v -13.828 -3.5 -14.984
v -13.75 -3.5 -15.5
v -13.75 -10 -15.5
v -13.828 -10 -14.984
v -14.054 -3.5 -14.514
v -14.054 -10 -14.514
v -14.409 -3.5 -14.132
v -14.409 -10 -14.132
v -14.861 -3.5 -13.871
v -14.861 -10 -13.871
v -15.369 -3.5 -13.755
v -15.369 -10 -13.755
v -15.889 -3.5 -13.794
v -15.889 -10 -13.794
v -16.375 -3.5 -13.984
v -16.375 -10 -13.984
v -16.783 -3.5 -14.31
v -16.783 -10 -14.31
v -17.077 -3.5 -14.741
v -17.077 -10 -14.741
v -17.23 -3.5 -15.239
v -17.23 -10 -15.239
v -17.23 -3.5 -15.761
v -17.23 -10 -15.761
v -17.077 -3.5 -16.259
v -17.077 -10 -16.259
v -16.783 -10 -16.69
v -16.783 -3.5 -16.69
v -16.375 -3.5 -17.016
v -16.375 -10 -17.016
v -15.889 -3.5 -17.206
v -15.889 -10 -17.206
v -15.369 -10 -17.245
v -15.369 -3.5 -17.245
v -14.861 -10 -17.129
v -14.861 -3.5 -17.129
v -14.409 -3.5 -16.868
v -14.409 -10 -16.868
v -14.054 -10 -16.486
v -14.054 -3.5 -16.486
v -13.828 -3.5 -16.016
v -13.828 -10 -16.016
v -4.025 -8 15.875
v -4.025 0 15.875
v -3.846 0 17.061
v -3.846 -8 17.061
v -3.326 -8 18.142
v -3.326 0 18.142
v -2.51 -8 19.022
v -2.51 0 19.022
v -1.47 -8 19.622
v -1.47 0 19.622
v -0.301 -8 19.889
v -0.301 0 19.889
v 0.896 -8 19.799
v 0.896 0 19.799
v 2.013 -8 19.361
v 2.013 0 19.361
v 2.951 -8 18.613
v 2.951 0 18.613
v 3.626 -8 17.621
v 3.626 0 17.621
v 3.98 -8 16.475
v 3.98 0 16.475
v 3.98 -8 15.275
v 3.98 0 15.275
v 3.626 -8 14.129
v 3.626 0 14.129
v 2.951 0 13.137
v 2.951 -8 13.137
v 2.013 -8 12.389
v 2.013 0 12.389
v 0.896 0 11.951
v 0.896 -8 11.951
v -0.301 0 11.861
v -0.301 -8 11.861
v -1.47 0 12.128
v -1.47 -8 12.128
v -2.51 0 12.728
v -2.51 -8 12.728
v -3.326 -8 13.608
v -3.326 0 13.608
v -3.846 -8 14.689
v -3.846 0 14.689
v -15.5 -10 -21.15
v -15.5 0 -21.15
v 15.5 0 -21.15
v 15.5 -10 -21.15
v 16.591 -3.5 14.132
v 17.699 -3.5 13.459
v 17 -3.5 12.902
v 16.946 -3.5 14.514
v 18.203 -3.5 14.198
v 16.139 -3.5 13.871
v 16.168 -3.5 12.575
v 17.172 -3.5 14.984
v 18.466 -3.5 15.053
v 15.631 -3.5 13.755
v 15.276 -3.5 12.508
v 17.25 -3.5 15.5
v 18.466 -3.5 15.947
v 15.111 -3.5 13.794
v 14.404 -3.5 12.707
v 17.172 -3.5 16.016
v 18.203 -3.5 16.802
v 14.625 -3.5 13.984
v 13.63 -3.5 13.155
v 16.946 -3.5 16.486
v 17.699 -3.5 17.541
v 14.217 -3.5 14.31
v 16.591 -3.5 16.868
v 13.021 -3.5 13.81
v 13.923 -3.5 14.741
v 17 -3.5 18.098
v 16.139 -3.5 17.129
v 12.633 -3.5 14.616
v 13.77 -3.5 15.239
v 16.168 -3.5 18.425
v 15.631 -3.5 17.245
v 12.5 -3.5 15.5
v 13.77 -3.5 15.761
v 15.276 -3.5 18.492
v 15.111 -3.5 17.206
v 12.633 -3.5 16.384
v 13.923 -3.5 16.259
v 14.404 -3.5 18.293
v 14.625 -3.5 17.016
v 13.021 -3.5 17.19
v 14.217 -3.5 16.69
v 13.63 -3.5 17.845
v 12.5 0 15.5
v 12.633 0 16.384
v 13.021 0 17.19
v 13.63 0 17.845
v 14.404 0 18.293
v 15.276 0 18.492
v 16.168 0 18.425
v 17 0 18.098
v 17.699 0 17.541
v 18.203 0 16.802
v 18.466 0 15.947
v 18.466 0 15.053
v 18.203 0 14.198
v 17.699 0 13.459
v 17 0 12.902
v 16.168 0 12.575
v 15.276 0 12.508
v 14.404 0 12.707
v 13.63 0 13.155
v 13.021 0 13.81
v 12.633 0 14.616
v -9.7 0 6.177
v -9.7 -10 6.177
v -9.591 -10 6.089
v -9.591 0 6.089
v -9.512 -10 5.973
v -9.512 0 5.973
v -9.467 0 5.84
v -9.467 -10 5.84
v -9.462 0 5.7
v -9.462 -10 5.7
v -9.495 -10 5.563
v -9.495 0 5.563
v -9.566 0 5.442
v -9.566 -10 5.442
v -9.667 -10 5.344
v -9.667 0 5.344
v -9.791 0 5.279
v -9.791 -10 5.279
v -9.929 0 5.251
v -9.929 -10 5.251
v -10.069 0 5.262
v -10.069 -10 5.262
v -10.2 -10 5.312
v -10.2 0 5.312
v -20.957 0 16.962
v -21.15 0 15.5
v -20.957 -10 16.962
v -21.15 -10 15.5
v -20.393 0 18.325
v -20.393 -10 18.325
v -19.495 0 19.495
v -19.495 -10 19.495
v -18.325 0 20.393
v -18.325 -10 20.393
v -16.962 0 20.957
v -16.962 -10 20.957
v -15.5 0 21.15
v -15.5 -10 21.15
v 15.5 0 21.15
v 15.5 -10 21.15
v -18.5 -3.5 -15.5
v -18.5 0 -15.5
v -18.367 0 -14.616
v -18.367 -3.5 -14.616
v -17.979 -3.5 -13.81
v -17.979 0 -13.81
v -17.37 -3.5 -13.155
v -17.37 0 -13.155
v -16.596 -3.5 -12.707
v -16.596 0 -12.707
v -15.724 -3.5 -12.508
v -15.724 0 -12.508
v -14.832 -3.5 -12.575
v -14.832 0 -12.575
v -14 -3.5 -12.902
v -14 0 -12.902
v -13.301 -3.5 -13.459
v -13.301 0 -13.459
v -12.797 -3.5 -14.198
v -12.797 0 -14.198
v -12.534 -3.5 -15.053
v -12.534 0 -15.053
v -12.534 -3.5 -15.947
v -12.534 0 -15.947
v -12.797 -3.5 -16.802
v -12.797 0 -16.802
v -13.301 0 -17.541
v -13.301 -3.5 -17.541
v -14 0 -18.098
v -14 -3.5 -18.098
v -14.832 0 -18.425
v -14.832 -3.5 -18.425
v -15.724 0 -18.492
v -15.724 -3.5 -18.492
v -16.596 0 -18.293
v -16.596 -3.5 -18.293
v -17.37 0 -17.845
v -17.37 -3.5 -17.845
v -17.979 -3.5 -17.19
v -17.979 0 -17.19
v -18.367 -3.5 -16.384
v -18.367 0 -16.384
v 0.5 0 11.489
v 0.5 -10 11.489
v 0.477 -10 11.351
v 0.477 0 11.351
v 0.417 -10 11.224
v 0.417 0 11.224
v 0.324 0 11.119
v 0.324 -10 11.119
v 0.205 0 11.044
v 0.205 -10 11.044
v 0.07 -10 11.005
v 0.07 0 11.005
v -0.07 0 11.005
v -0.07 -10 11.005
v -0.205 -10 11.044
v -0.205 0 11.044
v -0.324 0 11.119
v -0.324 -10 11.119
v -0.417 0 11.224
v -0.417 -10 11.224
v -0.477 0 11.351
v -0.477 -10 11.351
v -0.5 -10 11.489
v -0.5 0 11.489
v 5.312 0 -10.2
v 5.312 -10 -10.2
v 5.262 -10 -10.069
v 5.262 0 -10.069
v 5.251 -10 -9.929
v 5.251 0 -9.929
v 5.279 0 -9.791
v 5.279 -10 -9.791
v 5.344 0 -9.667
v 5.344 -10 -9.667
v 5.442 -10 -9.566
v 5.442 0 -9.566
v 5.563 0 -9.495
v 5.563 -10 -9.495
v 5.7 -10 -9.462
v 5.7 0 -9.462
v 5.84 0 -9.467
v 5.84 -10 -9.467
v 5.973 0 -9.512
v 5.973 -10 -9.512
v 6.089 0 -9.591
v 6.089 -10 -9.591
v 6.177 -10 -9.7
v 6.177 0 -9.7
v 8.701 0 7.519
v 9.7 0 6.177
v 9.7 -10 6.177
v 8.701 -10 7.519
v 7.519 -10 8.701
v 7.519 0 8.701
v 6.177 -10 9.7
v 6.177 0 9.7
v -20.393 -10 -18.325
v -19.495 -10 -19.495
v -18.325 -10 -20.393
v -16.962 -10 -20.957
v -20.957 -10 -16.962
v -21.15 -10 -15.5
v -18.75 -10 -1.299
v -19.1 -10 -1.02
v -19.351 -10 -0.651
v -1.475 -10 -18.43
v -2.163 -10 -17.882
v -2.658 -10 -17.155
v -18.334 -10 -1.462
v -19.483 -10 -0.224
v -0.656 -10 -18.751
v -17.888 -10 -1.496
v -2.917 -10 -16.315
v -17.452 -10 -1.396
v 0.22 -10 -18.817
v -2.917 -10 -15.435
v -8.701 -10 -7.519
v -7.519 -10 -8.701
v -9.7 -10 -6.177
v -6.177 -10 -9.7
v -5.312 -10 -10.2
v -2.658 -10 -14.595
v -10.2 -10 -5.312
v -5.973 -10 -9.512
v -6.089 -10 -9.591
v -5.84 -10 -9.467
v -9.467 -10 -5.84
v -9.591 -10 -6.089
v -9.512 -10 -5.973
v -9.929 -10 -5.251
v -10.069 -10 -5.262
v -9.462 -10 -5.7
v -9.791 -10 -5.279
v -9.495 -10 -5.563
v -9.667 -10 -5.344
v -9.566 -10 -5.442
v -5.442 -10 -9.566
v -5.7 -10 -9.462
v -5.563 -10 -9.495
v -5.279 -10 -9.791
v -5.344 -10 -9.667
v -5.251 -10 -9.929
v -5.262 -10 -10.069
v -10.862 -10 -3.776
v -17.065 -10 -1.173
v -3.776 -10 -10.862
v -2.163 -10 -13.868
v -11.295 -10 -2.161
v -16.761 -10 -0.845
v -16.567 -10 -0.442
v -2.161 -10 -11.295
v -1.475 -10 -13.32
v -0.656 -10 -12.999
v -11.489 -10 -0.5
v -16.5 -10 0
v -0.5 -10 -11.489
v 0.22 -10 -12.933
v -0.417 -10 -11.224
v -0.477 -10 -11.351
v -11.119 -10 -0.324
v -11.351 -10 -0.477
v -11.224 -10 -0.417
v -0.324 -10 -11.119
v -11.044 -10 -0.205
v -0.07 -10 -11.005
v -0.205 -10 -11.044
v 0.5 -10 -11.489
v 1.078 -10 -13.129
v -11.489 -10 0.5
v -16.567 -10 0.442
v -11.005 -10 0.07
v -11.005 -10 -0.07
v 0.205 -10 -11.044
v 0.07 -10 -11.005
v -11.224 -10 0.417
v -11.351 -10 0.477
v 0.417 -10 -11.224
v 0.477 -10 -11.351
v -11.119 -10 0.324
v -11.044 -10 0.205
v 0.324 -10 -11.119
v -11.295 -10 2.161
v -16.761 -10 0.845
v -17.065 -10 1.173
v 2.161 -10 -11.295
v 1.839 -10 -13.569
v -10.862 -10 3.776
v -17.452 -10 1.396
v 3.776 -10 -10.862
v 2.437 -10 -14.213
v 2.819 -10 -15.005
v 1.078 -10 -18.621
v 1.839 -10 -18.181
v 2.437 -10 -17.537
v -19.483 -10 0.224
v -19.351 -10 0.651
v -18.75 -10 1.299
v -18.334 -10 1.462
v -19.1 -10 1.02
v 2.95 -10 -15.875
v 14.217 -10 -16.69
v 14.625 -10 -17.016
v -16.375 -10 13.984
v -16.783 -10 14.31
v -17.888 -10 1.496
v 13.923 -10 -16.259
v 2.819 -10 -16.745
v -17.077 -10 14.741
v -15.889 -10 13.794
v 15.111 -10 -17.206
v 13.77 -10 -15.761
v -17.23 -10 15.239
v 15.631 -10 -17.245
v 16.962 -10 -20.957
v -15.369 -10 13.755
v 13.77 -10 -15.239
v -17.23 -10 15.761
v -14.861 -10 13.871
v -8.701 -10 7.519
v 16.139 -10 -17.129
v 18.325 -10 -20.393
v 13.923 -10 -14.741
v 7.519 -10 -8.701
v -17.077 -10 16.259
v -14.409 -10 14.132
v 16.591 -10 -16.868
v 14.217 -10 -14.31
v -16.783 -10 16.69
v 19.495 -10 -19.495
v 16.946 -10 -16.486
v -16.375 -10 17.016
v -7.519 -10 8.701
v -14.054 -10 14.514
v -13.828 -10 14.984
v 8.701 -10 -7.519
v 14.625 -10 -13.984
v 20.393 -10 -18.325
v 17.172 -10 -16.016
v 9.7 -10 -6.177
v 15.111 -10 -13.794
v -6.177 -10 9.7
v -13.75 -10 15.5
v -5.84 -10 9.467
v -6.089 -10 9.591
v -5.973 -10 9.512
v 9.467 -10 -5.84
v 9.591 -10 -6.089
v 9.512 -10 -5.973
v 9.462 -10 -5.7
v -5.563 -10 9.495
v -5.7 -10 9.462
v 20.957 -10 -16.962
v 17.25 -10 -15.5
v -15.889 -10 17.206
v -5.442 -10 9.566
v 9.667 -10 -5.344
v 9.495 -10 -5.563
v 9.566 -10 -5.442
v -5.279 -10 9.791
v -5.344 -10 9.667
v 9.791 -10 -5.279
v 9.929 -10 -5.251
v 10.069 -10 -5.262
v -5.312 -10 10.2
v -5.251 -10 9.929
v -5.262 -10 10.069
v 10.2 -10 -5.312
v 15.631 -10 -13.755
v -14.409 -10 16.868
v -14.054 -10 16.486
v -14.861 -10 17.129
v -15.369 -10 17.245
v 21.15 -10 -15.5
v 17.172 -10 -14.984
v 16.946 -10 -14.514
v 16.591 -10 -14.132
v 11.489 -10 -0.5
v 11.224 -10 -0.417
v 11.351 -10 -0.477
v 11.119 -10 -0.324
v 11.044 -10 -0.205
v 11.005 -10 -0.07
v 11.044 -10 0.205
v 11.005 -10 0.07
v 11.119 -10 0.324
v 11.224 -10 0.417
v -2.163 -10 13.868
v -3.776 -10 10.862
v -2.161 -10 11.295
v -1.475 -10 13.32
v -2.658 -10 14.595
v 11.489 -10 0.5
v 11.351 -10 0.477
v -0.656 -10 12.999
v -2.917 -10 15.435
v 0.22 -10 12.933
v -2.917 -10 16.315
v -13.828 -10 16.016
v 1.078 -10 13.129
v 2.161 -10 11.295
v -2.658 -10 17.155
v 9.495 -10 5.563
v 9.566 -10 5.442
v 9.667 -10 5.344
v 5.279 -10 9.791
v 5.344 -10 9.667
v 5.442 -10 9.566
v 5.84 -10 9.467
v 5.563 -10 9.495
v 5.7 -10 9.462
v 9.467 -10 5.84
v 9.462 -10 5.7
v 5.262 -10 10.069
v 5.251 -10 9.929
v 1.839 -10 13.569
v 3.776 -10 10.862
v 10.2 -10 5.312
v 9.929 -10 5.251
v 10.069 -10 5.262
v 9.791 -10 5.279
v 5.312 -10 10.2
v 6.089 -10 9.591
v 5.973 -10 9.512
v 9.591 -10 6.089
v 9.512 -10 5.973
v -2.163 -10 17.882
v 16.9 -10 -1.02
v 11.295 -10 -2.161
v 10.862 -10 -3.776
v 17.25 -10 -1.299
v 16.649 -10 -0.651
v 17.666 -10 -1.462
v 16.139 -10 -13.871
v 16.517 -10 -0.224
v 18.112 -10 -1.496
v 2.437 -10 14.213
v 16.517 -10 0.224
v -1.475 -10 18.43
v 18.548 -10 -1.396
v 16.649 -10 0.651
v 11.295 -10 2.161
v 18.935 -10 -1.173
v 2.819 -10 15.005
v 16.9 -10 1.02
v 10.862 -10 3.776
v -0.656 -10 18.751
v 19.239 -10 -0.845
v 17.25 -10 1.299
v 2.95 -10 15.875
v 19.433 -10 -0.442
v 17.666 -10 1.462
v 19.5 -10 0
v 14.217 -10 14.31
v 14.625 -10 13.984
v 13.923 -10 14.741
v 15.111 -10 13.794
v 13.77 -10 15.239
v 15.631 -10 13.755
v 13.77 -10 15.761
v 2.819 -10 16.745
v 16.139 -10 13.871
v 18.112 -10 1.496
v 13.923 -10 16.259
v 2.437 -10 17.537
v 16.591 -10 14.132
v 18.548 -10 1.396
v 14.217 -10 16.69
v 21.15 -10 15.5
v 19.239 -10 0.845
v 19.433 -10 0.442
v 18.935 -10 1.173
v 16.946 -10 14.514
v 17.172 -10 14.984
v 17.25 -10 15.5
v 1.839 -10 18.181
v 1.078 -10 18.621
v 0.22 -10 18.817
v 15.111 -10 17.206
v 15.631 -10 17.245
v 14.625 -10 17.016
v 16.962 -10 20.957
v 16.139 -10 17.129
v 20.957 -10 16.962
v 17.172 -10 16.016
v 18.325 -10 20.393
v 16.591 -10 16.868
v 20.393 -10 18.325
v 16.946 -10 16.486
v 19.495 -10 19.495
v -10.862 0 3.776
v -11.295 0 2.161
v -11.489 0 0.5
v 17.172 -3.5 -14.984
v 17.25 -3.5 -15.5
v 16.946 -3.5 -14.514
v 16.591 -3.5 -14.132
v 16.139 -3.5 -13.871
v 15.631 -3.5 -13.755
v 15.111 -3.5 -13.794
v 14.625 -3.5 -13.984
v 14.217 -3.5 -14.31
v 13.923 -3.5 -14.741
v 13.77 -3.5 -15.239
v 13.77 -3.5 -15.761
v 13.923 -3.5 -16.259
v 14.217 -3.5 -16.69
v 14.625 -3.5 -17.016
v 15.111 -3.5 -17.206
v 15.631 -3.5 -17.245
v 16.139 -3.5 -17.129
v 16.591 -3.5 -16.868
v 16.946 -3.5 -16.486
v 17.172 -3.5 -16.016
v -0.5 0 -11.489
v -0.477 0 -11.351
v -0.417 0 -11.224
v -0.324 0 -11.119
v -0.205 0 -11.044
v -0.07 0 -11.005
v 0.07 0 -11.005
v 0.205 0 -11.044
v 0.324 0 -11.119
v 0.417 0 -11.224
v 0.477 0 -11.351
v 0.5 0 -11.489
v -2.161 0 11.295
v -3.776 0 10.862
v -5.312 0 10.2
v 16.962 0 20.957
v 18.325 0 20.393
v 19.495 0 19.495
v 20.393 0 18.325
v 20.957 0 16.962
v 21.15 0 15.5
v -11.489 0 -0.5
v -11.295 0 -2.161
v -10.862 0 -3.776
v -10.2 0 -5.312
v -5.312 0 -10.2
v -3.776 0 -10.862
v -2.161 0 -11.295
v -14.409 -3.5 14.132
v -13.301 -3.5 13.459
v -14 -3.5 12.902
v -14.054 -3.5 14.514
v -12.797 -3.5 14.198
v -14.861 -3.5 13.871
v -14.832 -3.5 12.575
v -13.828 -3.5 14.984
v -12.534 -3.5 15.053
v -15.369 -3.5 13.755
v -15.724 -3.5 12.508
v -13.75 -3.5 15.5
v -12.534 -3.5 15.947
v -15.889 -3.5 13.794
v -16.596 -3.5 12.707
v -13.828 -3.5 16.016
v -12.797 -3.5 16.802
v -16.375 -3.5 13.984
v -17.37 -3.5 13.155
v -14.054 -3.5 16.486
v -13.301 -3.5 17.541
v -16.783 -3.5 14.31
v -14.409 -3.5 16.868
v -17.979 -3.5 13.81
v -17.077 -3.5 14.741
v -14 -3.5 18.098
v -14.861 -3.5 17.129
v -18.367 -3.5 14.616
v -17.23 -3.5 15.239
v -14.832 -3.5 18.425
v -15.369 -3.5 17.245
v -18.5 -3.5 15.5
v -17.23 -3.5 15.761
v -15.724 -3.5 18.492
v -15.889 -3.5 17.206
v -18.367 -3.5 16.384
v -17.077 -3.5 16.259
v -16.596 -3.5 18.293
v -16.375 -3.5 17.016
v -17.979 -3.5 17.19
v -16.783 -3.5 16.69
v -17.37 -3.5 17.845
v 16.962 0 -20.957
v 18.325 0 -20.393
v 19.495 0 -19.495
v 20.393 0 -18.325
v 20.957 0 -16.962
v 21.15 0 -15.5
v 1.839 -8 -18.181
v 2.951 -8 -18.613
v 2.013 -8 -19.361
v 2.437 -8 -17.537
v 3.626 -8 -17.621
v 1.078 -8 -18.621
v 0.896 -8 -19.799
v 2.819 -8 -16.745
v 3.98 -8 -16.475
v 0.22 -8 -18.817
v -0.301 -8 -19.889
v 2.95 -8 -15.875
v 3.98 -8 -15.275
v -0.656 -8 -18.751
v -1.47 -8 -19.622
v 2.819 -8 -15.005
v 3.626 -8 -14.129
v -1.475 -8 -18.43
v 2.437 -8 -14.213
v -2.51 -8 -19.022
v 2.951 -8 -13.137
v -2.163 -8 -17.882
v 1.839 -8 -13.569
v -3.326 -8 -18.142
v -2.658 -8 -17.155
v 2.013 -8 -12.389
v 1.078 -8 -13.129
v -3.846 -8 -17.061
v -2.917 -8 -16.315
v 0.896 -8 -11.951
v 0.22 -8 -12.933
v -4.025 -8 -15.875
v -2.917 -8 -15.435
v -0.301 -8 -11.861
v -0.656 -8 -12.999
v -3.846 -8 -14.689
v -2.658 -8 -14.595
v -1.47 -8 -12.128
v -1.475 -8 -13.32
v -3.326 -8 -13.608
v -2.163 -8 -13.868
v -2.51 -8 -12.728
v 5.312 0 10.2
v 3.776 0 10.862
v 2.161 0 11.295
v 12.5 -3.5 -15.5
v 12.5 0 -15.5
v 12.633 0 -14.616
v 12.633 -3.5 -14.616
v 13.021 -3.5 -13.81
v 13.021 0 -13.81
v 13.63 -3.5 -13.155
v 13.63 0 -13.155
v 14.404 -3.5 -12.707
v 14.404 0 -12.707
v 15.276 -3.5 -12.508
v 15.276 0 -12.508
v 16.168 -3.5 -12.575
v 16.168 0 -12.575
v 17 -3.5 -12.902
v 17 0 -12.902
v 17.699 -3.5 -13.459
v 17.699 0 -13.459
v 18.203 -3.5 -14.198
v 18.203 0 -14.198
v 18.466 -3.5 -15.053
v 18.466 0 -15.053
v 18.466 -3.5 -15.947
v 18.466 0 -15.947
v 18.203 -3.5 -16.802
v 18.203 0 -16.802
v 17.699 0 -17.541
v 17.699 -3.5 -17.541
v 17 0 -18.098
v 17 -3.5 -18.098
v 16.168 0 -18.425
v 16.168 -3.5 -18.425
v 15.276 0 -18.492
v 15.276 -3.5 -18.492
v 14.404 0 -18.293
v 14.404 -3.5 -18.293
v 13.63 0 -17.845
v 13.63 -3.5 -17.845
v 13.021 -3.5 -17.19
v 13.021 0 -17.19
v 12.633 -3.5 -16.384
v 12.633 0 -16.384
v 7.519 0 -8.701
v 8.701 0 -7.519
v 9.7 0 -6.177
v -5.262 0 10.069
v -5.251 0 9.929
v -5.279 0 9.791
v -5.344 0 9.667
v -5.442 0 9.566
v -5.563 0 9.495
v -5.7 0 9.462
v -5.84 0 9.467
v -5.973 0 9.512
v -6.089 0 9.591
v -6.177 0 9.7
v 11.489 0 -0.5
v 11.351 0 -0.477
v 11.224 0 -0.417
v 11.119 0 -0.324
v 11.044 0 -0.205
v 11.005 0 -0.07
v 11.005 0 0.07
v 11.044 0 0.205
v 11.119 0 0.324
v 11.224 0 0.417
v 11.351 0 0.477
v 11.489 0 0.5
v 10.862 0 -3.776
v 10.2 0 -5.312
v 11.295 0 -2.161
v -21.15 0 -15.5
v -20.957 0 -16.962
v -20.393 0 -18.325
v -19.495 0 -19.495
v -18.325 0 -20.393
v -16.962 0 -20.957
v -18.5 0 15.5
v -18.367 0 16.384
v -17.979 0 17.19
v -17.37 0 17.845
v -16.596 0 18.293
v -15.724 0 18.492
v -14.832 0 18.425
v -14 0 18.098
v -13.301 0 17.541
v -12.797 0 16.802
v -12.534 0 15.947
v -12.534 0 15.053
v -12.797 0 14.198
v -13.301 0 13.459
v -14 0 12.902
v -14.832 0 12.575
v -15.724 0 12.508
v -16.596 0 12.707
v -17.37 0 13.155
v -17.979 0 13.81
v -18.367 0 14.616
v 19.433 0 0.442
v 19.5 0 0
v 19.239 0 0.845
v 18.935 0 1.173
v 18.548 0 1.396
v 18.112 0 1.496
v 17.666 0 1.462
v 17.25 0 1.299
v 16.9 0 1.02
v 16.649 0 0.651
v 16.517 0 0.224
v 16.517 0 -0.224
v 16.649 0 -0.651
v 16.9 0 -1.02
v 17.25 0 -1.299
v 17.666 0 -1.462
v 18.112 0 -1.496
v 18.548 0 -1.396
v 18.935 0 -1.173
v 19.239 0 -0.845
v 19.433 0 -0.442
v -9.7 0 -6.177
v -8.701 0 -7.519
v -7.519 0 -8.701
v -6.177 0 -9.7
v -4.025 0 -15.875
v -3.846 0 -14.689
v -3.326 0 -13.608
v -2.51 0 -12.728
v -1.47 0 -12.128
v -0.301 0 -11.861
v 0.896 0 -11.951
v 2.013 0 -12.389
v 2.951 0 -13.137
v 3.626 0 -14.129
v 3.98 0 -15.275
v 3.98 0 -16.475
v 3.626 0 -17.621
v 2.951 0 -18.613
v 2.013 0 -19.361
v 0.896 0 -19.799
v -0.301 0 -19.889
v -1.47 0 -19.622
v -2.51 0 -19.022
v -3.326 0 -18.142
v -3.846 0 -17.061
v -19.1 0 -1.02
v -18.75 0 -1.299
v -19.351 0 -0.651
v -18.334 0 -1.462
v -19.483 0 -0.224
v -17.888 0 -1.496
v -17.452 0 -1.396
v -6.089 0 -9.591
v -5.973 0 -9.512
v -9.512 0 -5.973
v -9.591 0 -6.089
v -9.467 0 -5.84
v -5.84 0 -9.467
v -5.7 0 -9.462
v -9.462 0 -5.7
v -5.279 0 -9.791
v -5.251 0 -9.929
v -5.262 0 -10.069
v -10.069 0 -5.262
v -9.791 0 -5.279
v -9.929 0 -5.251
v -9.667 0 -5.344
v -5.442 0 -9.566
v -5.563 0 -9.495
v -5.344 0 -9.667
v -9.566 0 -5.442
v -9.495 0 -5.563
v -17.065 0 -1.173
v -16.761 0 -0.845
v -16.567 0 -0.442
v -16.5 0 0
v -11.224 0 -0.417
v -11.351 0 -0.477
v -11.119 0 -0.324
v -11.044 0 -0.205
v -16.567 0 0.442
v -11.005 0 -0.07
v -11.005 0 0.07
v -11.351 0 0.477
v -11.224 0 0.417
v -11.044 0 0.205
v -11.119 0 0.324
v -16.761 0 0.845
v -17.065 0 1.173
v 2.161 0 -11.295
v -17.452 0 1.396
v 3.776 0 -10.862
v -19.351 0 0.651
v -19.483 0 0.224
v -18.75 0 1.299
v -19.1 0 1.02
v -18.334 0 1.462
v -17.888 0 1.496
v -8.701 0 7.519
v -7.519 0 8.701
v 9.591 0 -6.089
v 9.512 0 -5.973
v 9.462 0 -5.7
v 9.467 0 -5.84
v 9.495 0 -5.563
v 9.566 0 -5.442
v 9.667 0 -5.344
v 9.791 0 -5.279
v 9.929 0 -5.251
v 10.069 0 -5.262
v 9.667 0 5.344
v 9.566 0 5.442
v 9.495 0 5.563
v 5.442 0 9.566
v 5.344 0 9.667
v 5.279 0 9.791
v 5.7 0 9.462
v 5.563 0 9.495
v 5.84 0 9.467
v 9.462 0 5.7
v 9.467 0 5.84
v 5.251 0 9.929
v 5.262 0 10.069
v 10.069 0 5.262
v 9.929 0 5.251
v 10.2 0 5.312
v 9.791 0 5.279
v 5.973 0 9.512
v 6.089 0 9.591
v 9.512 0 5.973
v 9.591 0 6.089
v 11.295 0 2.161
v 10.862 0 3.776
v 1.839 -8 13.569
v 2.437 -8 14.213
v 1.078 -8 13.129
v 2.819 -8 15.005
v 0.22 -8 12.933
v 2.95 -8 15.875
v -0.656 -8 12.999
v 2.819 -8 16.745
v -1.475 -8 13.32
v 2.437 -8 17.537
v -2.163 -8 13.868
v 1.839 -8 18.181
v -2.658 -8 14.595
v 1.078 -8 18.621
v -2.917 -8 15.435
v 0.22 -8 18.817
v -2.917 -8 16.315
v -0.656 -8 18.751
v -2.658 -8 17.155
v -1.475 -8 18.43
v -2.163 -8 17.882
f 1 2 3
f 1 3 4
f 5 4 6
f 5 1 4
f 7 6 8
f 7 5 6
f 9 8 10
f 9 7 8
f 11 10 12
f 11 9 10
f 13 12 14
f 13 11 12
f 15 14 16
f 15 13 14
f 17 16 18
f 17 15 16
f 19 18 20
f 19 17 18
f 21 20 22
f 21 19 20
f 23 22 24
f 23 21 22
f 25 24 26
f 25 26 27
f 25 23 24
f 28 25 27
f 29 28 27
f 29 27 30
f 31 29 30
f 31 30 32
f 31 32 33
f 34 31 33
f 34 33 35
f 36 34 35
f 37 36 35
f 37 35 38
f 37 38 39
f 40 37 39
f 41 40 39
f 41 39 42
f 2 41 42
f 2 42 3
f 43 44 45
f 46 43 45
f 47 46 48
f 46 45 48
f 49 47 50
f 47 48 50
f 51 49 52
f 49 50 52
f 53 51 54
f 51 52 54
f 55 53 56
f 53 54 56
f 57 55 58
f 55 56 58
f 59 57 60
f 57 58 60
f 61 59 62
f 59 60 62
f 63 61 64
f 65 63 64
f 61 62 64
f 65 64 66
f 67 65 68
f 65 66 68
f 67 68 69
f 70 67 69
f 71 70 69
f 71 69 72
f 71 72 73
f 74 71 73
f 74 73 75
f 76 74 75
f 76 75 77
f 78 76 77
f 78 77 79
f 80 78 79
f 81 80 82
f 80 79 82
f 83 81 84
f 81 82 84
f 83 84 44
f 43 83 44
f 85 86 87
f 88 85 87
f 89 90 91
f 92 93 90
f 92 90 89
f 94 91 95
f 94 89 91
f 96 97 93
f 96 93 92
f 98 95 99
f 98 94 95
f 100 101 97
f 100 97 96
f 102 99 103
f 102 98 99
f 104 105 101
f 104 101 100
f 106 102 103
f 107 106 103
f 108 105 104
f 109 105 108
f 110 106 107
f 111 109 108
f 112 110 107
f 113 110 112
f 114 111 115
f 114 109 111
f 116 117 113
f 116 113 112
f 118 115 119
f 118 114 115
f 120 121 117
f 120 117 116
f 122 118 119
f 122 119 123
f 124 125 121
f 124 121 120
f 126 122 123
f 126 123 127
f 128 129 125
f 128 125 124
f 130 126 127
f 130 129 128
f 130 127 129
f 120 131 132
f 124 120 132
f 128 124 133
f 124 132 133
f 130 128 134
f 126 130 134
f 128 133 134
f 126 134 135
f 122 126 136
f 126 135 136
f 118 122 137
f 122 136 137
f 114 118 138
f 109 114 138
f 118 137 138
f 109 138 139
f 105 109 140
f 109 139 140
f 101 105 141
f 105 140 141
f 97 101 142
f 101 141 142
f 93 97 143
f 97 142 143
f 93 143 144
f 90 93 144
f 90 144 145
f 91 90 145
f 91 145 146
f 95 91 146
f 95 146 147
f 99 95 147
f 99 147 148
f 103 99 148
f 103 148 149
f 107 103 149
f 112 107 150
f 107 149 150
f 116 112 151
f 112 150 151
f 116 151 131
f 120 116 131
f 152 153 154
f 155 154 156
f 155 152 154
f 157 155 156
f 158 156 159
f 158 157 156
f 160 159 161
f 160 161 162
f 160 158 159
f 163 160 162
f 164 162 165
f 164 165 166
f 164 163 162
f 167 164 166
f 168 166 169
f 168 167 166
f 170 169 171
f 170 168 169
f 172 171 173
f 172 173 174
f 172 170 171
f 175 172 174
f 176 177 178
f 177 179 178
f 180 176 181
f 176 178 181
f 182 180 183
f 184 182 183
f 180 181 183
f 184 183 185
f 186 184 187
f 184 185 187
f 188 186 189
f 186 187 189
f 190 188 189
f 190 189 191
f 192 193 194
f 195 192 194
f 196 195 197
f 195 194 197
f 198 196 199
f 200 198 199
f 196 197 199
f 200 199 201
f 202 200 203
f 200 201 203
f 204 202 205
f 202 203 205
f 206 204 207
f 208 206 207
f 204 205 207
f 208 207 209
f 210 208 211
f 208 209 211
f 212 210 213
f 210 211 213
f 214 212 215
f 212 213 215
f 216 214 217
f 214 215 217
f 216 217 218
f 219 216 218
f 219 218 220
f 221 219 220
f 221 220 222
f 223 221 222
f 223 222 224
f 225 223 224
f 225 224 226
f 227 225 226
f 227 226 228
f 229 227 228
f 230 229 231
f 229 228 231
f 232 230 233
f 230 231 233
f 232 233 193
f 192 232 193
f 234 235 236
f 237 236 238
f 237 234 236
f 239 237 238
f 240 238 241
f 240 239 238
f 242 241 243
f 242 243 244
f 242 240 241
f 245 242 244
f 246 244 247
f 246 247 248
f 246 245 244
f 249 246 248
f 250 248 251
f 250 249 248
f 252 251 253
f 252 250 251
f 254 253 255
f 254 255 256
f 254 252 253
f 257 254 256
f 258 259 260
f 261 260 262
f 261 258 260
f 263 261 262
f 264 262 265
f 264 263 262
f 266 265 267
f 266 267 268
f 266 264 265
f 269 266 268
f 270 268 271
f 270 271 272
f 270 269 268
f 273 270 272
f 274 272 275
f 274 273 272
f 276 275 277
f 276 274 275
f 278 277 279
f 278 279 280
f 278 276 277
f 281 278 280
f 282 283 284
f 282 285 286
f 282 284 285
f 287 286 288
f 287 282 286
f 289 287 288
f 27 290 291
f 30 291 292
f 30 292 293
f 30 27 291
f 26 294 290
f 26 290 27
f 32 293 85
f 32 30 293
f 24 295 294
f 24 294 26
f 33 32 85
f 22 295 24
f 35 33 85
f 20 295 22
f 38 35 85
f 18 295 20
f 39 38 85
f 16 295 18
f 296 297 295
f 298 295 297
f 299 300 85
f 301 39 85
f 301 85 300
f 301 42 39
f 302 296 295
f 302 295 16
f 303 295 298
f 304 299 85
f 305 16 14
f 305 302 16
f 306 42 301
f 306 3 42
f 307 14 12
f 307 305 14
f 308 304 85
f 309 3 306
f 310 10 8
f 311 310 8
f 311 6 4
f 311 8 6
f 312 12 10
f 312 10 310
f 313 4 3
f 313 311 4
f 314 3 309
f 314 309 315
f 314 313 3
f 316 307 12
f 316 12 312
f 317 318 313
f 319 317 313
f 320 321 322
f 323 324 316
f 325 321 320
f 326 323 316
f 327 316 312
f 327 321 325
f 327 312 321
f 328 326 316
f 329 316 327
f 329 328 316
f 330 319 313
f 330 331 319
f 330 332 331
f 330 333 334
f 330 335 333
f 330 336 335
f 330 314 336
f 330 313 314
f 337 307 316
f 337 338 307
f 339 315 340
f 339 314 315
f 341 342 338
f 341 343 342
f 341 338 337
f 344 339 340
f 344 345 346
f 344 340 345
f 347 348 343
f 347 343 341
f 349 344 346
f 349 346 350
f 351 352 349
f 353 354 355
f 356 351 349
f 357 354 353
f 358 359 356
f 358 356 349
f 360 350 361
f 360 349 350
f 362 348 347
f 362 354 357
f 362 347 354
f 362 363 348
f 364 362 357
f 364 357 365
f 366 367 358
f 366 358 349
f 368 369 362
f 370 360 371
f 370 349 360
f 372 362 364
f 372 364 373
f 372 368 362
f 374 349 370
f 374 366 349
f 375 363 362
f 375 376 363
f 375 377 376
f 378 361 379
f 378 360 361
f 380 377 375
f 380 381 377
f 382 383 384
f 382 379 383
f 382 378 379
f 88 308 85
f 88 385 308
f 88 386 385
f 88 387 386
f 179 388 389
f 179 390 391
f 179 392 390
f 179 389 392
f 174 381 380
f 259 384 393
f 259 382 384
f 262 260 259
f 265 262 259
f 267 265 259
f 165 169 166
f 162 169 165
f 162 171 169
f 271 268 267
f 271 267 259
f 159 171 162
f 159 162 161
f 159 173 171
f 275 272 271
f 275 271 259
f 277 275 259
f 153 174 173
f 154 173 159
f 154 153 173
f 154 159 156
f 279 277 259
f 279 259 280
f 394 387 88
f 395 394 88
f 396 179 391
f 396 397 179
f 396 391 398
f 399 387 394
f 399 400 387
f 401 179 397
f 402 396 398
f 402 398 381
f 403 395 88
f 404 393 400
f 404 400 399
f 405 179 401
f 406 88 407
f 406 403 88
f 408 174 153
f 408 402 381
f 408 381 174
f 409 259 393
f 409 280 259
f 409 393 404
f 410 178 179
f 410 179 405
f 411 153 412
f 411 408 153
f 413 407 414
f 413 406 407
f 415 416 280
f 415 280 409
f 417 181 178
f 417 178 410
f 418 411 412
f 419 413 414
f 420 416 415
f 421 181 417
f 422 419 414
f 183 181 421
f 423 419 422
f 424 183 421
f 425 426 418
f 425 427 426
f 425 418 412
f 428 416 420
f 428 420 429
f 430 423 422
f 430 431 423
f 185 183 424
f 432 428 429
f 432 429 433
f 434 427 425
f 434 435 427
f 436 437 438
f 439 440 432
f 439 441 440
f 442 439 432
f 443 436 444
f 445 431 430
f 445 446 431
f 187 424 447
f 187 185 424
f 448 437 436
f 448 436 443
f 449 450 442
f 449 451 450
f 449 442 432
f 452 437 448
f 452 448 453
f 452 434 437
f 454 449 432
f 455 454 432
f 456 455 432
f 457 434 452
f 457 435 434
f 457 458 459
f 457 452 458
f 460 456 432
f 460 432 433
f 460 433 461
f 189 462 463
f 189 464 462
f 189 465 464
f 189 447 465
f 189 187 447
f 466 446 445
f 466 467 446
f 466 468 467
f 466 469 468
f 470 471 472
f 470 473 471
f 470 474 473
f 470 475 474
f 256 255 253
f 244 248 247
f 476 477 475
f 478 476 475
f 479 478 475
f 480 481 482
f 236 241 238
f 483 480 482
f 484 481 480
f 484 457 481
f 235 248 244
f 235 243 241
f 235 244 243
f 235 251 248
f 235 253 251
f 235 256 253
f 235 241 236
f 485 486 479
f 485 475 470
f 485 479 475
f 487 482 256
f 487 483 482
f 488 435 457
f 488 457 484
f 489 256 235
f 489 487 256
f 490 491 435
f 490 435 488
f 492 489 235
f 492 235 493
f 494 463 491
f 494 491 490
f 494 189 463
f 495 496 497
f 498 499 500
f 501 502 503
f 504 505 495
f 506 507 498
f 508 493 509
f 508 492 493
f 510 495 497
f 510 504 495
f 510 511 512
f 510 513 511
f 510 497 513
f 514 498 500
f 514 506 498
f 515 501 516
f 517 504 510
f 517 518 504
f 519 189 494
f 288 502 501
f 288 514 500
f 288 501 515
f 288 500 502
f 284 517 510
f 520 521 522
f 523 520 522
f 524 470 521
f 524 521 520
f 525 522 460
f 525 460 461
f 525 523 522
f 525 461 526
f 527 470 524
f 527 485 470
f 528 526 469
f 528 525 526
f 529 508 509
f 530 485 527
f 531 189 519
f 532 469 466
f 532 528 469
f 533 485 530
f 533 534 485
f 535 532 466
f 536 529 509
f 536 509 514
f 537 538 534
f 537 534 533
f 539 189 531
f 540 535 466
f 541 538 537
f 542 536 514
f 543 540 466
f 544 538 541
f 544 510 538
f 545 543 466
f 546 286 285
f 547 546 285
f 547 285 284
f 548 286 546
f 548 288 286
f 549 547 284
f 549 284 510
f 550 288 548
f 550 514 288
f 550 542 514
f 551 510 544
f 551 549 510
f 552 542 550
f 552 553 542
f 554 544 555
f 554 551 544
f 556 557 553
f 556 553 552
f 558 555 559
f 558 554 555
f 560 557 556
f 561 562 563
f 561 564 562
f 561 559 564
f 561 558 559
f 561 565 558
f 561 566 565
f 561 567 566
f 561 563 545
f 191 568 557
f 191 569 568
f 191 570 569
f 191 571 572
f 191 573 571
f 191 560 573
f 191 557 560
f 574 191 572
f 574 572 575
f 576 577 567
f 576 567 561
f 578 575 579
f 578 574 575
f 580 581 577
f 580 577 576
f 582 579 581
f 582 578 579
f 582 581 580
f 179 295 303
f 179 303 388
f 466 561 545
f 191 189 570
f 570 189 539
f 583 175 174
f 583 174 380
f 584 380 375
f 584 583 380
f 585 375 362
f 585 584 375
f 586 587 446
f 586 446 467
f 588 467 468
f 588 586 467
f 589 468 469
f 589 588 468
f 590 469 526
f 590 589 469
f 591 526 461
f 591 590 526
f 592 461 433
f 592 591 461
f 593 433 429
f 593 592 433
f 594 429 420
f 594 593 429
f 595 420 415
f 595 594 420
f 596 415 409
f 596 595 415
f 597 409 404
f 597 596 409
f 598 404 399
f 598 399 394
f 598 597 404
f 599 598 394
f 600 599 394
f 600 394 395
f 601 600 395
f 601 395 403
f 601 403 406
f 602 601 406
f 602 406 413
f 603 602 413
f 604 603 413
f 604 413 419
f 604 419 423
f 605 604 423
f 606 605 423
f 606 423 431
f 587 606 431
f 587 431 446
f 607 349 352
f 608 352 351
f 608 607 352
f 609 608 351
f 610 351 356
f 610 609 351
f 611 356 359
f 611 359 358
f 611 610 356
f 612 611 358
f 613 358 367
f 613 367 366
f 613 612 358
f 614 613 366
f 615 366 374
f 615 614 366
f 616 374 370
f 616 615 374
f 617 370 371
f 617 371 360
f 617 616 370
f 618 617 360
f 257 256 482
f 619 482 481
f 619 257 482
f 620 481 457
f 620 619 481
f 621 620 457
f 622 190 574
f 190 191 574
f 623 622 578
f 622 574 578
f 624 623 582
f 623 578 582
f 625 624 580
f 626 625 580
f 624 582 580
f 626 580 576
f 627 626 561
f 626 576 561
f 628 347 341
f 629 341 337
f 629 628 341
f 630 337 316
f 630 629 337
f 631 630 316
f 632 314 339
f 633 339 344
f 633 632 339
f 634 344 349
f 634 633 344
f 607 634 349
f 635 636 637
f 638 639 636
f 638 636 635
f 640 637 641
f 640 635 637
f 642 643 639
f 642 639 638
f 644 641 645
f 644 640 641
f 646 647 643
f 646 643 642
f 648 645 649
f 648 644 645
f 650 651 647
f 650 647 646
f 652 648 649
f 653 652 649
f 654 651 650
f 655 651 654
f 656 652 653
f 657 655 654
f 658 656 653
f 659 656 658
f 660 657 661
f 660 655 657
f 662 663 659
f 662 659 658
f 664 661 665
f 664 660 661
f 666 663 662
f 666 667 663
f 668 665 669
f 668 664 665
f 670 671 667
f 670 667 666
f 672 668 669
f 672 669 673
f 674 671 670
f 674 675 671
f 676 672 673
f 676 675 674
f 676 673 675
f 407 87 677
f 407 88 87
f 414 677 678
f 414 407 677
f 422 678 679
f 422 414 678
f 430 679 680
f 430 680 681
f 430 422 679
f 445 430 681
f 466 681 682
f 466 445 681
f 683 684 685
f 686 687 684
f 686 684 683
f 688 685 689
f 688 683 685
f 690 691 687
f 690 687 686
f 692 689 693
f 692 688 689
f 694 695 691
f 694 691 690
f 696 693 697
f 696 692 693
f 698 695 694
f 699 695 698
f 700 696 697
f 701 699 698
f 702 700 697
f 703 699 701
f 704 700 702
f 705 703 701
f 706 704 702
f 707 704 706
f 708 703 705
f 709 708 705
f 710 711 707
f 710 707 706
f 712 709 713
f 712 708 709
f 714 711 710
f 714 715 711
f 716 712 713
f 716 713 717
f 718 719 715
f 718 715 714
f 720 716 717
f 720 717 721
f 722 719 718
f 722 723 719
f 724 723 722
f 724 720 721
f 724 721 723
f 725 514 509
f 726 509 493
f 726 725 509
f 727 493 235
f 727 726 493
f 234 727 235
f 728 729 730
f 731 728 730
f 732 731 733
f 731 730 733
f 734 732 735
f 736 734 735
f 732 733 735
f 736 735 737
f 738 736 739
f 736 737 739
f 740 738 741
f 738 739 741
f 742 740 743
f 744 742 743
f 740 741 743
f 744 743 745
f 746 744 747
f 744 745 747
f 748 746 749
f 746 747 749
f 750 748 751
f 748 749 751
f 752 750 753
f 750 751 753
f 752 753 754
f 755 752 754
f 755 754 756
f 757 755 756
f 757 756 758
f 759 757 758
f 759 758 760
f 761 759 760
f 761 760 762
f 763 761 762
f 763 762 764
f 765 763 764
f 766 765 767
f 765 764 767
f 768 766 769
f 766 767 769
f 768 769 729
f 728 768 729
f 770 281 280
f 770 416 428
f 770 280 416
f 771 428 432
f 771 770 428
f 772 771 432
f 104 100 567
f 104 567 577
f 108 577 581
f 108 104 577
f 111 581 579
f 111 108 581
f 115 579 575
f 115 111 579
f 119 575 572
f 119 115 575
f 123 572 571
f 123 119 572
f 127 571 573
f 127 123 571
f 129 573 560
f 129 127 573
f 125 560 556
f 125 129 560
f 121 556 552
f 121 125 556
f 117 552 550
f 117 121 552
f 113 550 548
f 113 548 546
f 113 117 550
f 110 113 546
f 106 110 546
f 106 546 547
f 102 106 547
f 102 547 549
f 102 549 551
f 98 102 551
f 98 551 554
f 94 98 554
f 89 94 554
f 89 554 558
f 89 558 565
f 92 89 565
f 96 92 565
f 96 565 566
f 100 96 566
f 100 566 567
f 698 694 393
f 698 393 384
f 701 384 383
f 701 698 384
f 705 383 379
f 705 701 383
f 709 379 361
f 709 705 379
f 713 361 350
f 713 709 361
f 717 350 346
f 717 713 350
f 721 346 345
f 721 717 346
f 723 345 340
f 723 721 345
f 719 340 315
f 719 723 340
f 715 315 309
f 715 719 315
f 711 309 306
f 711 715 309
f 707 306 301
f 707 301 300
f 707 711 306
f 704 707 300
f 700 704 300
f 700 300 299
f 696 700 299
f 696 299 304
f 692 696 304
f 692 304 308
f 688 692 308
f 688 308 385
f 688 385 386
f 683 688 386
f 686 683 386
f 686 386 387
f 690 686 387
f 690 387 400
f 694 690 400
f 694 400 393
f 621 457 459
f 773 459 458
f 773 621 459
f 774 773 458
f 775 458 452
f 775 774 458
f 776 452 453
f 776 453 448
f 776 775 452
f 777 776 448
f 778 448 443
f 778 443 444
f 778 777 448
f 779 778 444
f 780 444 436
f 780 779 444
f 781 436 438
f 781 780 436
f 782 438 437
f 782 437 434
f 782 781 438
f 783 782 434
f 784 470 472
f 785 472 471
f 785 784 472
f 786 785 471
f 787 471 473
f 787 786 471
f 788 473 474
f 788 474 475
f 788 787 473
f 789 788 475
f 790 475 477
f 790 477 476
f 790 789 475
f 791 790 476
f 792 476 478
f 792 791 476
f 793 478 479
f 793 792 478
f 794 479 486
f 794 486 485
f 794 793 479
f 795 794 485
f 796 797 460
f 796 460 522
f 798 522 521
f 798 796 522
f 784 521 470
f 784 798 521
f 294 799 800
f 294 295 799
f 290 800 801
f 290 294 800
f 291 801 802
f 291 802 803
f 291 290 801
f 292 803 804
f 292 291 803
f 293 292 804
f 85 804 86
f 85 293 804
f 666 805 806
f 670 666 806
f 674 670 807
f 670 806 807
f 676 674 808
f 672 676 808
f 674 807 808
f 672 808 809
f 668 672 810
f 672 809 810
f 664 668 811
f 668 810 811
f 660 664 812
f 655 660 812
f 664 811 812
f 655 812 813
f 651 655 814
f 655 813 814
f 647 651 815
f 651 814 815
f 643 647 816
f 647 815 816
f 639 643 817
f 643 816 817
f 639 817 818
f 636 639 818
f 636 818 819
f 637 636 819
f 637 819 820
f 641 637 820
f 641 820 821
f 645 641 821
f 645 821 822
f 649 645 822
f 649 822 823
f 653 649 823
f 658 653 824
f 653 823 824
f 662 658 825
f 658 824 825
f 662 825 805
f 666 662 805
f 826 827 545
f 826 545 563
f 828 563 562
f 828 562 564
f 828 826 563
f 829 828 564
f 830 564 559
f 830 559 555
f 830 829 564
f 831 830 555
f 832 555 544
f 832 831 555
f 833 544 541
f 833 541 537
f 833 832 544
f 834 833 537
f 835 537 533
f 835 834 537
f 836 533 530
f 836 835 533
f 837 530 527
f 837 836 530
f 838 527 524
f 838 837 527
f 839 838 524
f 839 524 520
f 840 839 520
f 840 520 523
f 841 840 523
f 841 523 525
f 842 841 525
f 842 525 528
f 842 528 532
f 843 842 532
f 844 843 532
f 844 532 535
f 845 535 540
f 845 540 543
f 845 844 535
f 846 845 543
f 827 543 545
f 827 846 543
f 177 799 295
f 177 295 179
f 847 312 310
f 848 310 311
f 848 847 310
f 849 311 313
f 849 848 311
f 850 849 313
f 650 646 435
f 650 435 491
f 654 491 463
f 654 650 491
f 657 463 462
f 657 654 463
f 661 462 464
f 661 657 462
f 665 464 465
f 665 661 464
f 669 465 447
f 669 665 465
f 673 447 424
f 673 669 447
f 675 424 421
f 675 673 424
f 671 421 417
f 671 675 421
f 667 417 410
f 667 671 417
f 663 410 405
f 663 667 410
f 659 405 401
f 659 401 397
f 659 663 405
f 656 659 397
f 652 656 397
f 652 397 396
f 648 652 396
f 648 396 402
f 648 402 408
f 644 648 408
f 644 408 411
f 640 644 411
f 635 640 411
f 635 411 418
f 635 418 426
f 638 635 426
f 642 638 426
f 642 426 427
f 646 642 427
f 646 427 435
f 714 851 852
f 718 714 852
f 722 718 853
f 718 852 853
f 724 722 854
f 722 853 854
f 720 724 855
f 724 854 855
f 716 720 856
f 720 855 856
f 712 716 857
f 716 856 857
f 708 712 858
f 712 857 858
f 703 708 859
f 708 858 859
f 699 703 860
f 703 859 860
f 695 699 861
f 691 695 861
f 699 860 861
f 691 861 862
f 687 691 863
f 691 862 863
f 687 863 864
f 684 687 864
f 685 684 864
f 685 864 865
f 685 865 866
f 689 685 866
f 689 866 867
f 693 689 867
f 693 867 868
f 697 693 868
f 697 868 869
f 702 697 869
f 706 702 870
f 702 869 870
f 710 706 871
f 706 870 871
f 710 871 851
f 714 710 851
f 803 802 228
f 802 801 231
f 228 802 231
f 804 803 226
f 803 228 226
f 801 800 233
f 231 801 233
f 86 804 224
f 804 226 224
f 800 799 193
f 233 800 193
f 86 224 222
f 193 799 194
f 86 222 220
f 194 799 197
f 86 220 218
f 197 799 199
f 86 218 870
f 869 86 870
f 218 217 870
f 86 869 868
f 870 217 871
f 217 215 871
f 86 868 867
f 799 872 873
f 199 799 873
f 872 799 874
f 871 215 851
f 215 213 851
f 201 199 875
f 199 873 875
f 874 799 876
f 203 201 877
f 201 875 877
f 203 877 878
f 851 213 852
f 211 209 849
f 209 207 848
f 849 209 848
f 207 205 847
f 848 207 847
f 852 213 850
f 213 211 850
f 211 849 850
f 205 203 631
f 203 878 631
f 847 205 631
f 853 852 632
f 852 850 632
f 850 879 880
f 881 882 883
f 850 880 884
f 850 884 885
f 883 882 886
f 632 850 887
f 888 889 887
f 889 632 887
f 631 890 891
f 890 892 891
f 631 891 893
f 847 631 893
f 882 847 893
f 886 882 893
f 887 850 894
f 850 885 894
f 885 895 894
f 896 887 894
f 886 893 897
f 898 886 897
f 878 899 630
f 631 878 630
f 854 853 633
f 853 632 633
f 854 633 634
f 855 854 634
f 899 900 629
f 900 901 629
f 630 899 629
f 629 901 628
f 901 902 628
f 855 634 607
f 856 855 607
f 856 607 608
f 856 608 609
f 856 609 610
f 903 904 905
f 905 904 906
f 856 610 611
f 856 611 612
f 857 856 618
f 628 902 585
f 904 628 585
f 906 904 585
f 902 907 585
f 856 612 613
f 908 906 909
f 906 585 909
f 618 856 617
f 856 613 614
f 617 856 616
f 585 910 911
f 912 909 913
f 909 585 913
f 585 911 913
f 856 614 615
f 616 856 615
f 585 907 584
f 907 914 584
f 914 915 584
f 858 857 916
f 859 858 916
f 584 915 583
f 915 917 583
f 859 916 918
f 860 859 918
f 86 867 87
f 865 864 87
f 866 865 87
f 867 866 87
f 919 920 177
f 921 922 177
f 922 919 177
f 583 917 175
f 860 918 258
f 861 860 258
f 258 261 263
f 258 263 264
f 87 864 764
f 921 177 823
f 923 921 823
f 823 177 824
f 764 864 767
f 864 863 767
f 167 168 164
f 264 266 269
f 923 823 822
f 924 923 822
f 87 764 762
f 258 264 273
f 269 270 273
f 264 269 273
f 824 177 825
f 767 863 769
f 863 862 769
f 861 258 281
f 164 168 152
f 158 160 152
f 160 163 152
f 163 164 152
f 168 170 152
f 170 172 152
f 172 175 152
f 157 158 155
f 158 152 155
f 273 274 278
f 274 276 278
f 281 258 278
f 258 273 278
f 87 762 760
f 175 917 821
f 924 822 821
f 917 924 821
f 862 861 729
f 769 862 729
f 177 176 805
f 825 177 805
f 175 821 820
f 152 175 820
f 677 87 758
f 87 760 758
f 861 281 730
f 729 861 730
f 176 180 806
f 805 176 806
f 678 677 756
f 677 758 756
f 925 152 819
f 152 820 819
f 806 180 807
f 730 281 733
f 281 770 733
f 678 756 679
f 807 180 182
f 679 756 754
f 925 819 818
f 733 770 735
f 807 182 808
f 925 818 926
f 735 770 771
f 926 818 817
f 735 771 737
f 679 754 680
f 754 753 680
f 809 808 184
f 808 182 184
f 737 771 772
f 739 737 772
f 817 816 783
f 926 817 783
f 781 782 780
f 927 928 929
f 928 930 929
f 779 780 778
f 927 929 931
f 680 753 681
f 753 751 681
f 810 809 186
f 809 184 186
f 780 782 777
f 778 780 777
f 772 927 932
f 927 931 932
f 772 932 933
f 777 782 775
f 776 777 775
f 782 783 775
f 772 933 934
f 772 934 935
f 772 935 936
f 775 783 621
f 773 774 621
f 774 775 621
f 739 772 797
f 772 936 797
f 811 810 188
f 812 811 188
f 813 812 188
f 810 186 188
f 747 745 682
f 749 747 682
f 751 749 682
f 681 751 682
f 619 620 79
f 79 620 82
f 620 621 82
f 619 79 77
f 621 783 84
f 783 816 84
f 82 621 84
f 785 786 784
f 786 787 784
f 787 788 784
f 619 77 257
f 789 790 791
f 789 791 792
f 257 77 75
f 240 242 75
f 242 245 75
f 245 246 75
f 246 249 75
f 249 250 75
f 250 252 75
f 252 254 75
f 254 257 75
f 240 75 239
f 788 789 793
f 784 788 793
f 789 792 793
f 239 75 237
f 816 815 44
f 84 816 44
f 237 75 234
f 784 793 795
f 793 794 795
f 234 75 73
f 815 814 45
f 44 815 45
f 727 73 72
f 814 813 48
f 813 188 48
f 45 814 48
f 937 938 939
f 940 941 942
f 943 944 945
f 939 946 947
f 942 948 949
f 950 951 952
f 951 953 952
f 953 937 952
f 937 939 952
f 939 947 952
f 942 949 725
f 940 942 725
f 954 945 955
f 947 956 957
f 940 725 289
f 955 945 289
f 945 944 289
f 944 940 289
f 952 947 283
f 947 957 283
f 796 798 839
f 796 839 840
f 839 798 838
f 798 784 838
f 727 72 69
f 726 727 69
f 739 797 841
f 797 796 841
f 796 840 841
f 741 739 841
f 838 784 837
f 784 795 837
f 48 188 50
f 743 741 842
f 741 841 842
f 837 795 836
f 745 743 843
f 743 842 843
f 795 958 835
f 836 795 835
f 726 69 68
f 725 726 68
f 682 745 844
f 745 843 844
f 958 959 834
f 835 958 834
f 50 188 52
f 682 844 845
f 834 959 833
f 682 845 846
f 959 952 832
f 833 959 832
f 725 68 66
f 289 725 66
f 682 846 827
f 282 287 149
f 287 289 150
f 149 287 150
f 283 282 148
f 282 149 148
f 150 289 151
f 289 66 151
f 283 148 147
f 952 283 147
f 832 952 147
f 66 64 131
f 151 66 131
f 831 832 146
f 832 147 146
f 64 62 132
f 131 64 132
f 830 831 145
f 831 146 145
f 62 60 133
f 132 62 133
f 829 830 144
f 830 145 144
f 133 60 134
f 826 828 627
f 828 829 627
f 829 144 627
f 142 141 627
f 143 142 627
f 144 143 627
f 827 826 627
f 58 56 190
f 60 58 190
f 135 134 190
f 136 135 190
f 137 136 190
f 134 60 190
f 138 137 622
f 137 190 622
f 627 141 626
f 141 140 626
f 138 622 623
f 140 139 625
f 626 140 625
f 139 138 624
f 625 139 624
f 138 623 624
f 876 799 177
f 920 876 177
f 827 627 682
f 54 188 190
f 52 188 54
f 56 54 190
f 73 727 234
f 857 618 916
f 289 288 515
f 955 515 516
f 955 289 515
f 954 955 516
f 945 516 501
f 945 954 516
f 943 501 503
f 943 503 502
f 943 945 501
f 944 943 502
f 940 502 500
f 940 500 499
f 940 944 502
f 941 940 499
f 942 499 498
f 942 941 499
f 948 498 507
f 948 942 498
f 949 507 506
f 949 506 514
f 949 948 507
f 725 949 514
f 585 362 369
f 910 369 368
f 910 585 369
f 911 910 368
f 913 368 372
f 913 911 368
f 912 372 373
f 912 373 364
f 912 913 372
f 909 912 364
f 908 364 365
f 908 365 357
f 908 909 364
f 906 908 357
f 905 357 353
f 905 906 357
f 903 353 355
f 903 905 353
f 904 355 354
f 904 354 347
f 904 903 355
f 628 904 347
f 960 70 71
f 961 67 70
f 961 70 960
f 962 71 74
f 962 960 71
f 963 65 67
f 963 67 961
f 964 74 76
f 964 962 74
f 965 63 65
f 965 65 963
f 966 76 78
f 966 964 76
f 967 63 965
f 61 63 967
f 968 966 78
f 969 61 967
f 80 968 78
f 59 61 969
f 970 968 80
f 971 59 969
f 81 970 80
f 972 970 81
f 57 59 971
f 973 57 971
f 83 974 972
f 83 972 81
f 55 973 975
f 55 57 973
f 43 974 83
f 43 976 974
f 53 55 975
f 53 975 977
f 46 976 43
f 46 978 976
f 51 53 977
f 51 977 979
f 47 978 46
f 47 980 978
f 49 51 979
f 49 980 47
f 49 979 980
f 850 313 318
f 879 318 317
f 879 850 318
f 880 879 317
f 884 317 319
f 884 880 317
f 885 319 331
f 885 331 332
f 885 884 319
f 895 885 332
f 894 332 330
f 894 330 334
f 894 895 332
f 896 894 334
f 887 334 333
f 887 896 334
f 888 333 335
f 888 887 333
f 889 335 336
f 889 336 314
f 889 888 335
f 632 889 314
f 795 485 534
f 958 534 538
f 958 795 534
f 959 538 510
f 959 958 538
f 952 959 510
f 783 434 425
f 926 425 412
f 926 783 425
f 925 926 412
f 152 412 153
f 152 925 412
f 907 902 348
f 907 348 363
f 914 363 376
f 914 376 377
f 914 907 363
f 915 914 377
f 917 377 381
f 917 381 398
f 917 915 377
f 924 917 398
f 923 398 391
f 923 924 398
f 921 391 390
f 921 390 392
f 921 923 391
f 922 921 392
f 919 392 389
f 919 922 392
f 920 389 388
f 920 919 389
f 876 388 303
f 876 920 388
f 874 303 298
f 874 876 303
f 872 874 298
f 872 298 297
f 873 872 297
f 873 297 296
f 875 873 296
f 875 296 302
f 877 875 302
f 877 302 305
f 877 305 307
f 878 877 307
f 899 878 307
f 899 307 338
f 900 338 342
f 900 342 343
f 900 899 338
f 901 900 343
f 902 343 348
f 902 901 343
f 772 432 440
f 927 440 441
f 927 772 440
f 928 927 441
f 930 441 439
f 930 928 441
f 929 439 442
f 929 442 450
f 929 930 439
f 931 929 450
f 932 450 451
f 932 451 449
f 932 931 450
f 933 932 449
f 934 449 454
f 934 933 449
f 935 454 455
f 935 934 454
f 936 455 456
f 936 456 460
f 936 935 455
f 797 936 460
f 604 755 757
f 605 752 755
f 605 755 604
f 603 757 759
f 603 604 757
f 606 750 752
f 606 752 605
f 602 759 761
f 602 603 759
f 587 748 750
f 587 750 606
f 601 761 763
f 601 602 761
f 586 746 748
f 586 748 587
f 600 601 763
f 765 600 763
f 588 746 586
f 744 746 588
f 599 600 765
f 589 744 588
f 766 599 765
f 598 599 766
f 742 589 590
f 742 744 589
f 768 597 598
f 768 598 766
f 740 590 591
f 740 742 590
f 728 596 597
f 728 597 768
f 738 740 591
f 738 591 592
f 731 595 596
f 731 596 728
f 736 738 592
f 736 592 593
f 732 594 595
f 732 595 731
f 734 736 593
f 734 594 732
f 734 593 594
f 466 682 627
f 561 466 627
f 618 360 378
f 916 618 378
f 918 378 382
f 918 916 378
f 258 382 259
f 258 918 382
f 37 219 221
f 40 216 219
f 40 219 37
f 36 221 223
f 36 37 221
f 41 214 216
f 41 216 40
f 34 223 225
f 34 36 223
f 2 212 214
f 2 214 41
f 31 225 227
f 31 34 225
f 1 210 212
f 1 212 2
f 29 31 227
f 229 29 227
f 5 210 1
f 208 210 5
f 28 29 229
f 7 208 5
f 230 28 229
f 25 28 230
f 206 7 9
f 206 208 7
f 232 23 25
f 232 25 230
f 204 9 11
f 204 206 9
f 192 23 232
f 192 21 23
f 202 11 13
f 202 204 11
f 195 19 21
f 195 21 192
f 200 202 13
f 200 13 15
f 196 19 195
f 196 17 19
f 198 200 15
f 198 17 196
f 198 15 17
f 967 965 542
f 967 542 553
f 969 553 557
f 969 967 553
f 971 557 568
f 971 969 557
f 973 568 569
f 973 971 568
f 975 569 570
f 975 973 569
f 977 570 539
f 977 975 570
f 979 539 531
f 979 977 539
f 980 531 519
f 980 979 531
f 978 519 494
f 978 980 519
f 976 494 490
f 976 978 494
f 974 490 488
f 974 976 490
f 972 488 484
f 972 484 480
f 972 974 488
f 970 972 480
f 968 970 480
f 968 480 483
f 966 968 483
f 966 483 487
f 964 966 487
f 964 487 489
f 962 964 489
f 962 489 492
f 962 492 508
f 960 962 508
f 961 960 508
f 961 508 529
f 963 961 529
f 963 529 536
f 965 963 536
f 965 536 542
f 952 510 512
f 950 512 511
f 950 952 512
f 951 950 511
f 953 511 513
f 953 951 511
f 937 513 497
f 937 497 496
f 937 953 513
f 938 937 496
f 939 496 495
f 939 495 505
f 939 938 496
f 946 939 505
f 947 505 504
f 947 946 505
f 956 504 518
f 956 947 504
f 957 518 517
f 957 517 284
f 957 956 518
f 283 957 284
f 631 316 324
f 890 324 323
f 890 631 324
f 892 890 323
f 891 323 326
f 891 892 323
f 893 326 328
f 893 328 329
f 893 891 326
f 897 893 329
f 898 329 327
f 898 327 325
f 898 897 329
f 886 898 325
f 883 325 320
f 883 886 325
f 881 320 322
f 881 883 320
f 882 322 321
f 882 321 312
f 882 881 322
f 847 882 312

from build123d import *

# Parameters (mm, degrees)
F0_W            = 42.3
F0_H            = 42.3
F0_R            = 1.75
F0_R_2          = 2.95
F0_R_3          = 1.5
F0_R_4          = 11.5
F1_DEPTH        = 10
F2_R            = 3
F3_DEPTH        = 3.5
F4_R            = 4.025
F5_DEPTH        = 8
F6_R            = 5.65
F8_DEPTH        = 10
F8_COPIES_COUNT = 12


# Not quite as in the source:
# - a pattern or mirror of a feature is missing from the dataset's text; its kind, count and spacing are read off the source's solid


with BuildPart() as f1:
    # F0 (on Front) → F1 (new body)
    with BuildSketch(Plane.XZ):
        Rectangle(F0_W, F0_H)
        with Locations((-15.5, -15.5)):
            Circle(F0_R, mode=Mode.SUBTRACT)
        with Locations((0, -15.875)):
            Circle(F0_R_2, mode=Mode.SUBTRACT)
        with Locations((15.5, -15.5)):
            Circle(F0_R, mode=Mode.SUBTRACT)
        with Locations((-18, 0)):
            Circle(F0_R_3, mode=Mode.SUBTRACT)
        with Locations((-15.5, 15.5)):
            Circle(F0_R, mode=Mode.SUBTRACT)
        Circle(F0_R_4, mode=Mode.SUBTRACT)
        with Locations((18, 0)):
            Circle(F0_R_3, mode=Mode.SUBTRACT)
        with Locations((0, 15.875)):
            Circle(F0_R_2, mode=Mode.SUBTRACT)
        with Locations((15.5, 15.5)):
            Circle(F0_R, mode=Mode.SUBTRACT)
    extrude(amount=F1_DEPTH)

    # F2 (on face) → F3 (cut)
    with BuildSketch(Plane(origin=(0, 0, 0), x_dir=(-1, 0, 0), z_dir=(0, 1, 0))):
        with Locations((-15.5, 15.5)):
            Circle(F2_R)
        with Locations((15.5, 15.5)):
            Circle(F2_R)
        with Locations((15.5, -15.5)):
            Circle(F2_R)
        with Locations((-15.5, -15.5)):
            Circle(F2_R)
    extrude(amount=-F3_DEPTH, mode=Mode.SUBTRACT)

    # F4 (on face) → F5 (cut)
    with BuildSketch(Plane(origin=(0, 0, 0), x_dir=(-1, 0, 0), z_dir=(0, 1, 0))):
        with Locations((0, 15.875)):
            Circle(F4_R)
        with Locations((0, -15.875)):
            Circle(F4_R)
    extrude(amount=-F5_DEPTH, mode=Mode.SUBTRACT)

    # F6
    f6_edges = [f1.edges().sort_by_distance(p)[0] for p in [
        (21.15, -5, 21.15),
        (21.15, -5, -21.15),
        (-21.15, -5, 21.15),
        (-21.15, -5, -21.15),
    ]]
    fillet(f6_edges, radius=F6_R)

    # F7 (on face) → F8 (join)
    with BuildSketch(Plane(origin=(0, 0, 0), x_dir=(-1, 0, 0), z_dir=(0, 1, 0))):
        with BuildLine():
            ThreePointArc((11.4891304348, -0.4998818386), (11.5, 0), (11.4891304348, 0.4998818386))
            ThreePointArc((11.4891304348, 0.4998818386), (11, 0), (11.4891304348, -0.4998818386))
        make_face()
    f8 = extrude(amount=-F8_DEPTH)

    # F8_copies: F8 ×12 about axis
    f8_copies_axis = Axis((0, 0, 0), (0, 1, 0))
    for i in range(1, F8_COPIES_COUNT):
        add(f8.rotate(f8_copies_axis, i * 360 / F8_COPIES_COUNT))


solid = f1.part
